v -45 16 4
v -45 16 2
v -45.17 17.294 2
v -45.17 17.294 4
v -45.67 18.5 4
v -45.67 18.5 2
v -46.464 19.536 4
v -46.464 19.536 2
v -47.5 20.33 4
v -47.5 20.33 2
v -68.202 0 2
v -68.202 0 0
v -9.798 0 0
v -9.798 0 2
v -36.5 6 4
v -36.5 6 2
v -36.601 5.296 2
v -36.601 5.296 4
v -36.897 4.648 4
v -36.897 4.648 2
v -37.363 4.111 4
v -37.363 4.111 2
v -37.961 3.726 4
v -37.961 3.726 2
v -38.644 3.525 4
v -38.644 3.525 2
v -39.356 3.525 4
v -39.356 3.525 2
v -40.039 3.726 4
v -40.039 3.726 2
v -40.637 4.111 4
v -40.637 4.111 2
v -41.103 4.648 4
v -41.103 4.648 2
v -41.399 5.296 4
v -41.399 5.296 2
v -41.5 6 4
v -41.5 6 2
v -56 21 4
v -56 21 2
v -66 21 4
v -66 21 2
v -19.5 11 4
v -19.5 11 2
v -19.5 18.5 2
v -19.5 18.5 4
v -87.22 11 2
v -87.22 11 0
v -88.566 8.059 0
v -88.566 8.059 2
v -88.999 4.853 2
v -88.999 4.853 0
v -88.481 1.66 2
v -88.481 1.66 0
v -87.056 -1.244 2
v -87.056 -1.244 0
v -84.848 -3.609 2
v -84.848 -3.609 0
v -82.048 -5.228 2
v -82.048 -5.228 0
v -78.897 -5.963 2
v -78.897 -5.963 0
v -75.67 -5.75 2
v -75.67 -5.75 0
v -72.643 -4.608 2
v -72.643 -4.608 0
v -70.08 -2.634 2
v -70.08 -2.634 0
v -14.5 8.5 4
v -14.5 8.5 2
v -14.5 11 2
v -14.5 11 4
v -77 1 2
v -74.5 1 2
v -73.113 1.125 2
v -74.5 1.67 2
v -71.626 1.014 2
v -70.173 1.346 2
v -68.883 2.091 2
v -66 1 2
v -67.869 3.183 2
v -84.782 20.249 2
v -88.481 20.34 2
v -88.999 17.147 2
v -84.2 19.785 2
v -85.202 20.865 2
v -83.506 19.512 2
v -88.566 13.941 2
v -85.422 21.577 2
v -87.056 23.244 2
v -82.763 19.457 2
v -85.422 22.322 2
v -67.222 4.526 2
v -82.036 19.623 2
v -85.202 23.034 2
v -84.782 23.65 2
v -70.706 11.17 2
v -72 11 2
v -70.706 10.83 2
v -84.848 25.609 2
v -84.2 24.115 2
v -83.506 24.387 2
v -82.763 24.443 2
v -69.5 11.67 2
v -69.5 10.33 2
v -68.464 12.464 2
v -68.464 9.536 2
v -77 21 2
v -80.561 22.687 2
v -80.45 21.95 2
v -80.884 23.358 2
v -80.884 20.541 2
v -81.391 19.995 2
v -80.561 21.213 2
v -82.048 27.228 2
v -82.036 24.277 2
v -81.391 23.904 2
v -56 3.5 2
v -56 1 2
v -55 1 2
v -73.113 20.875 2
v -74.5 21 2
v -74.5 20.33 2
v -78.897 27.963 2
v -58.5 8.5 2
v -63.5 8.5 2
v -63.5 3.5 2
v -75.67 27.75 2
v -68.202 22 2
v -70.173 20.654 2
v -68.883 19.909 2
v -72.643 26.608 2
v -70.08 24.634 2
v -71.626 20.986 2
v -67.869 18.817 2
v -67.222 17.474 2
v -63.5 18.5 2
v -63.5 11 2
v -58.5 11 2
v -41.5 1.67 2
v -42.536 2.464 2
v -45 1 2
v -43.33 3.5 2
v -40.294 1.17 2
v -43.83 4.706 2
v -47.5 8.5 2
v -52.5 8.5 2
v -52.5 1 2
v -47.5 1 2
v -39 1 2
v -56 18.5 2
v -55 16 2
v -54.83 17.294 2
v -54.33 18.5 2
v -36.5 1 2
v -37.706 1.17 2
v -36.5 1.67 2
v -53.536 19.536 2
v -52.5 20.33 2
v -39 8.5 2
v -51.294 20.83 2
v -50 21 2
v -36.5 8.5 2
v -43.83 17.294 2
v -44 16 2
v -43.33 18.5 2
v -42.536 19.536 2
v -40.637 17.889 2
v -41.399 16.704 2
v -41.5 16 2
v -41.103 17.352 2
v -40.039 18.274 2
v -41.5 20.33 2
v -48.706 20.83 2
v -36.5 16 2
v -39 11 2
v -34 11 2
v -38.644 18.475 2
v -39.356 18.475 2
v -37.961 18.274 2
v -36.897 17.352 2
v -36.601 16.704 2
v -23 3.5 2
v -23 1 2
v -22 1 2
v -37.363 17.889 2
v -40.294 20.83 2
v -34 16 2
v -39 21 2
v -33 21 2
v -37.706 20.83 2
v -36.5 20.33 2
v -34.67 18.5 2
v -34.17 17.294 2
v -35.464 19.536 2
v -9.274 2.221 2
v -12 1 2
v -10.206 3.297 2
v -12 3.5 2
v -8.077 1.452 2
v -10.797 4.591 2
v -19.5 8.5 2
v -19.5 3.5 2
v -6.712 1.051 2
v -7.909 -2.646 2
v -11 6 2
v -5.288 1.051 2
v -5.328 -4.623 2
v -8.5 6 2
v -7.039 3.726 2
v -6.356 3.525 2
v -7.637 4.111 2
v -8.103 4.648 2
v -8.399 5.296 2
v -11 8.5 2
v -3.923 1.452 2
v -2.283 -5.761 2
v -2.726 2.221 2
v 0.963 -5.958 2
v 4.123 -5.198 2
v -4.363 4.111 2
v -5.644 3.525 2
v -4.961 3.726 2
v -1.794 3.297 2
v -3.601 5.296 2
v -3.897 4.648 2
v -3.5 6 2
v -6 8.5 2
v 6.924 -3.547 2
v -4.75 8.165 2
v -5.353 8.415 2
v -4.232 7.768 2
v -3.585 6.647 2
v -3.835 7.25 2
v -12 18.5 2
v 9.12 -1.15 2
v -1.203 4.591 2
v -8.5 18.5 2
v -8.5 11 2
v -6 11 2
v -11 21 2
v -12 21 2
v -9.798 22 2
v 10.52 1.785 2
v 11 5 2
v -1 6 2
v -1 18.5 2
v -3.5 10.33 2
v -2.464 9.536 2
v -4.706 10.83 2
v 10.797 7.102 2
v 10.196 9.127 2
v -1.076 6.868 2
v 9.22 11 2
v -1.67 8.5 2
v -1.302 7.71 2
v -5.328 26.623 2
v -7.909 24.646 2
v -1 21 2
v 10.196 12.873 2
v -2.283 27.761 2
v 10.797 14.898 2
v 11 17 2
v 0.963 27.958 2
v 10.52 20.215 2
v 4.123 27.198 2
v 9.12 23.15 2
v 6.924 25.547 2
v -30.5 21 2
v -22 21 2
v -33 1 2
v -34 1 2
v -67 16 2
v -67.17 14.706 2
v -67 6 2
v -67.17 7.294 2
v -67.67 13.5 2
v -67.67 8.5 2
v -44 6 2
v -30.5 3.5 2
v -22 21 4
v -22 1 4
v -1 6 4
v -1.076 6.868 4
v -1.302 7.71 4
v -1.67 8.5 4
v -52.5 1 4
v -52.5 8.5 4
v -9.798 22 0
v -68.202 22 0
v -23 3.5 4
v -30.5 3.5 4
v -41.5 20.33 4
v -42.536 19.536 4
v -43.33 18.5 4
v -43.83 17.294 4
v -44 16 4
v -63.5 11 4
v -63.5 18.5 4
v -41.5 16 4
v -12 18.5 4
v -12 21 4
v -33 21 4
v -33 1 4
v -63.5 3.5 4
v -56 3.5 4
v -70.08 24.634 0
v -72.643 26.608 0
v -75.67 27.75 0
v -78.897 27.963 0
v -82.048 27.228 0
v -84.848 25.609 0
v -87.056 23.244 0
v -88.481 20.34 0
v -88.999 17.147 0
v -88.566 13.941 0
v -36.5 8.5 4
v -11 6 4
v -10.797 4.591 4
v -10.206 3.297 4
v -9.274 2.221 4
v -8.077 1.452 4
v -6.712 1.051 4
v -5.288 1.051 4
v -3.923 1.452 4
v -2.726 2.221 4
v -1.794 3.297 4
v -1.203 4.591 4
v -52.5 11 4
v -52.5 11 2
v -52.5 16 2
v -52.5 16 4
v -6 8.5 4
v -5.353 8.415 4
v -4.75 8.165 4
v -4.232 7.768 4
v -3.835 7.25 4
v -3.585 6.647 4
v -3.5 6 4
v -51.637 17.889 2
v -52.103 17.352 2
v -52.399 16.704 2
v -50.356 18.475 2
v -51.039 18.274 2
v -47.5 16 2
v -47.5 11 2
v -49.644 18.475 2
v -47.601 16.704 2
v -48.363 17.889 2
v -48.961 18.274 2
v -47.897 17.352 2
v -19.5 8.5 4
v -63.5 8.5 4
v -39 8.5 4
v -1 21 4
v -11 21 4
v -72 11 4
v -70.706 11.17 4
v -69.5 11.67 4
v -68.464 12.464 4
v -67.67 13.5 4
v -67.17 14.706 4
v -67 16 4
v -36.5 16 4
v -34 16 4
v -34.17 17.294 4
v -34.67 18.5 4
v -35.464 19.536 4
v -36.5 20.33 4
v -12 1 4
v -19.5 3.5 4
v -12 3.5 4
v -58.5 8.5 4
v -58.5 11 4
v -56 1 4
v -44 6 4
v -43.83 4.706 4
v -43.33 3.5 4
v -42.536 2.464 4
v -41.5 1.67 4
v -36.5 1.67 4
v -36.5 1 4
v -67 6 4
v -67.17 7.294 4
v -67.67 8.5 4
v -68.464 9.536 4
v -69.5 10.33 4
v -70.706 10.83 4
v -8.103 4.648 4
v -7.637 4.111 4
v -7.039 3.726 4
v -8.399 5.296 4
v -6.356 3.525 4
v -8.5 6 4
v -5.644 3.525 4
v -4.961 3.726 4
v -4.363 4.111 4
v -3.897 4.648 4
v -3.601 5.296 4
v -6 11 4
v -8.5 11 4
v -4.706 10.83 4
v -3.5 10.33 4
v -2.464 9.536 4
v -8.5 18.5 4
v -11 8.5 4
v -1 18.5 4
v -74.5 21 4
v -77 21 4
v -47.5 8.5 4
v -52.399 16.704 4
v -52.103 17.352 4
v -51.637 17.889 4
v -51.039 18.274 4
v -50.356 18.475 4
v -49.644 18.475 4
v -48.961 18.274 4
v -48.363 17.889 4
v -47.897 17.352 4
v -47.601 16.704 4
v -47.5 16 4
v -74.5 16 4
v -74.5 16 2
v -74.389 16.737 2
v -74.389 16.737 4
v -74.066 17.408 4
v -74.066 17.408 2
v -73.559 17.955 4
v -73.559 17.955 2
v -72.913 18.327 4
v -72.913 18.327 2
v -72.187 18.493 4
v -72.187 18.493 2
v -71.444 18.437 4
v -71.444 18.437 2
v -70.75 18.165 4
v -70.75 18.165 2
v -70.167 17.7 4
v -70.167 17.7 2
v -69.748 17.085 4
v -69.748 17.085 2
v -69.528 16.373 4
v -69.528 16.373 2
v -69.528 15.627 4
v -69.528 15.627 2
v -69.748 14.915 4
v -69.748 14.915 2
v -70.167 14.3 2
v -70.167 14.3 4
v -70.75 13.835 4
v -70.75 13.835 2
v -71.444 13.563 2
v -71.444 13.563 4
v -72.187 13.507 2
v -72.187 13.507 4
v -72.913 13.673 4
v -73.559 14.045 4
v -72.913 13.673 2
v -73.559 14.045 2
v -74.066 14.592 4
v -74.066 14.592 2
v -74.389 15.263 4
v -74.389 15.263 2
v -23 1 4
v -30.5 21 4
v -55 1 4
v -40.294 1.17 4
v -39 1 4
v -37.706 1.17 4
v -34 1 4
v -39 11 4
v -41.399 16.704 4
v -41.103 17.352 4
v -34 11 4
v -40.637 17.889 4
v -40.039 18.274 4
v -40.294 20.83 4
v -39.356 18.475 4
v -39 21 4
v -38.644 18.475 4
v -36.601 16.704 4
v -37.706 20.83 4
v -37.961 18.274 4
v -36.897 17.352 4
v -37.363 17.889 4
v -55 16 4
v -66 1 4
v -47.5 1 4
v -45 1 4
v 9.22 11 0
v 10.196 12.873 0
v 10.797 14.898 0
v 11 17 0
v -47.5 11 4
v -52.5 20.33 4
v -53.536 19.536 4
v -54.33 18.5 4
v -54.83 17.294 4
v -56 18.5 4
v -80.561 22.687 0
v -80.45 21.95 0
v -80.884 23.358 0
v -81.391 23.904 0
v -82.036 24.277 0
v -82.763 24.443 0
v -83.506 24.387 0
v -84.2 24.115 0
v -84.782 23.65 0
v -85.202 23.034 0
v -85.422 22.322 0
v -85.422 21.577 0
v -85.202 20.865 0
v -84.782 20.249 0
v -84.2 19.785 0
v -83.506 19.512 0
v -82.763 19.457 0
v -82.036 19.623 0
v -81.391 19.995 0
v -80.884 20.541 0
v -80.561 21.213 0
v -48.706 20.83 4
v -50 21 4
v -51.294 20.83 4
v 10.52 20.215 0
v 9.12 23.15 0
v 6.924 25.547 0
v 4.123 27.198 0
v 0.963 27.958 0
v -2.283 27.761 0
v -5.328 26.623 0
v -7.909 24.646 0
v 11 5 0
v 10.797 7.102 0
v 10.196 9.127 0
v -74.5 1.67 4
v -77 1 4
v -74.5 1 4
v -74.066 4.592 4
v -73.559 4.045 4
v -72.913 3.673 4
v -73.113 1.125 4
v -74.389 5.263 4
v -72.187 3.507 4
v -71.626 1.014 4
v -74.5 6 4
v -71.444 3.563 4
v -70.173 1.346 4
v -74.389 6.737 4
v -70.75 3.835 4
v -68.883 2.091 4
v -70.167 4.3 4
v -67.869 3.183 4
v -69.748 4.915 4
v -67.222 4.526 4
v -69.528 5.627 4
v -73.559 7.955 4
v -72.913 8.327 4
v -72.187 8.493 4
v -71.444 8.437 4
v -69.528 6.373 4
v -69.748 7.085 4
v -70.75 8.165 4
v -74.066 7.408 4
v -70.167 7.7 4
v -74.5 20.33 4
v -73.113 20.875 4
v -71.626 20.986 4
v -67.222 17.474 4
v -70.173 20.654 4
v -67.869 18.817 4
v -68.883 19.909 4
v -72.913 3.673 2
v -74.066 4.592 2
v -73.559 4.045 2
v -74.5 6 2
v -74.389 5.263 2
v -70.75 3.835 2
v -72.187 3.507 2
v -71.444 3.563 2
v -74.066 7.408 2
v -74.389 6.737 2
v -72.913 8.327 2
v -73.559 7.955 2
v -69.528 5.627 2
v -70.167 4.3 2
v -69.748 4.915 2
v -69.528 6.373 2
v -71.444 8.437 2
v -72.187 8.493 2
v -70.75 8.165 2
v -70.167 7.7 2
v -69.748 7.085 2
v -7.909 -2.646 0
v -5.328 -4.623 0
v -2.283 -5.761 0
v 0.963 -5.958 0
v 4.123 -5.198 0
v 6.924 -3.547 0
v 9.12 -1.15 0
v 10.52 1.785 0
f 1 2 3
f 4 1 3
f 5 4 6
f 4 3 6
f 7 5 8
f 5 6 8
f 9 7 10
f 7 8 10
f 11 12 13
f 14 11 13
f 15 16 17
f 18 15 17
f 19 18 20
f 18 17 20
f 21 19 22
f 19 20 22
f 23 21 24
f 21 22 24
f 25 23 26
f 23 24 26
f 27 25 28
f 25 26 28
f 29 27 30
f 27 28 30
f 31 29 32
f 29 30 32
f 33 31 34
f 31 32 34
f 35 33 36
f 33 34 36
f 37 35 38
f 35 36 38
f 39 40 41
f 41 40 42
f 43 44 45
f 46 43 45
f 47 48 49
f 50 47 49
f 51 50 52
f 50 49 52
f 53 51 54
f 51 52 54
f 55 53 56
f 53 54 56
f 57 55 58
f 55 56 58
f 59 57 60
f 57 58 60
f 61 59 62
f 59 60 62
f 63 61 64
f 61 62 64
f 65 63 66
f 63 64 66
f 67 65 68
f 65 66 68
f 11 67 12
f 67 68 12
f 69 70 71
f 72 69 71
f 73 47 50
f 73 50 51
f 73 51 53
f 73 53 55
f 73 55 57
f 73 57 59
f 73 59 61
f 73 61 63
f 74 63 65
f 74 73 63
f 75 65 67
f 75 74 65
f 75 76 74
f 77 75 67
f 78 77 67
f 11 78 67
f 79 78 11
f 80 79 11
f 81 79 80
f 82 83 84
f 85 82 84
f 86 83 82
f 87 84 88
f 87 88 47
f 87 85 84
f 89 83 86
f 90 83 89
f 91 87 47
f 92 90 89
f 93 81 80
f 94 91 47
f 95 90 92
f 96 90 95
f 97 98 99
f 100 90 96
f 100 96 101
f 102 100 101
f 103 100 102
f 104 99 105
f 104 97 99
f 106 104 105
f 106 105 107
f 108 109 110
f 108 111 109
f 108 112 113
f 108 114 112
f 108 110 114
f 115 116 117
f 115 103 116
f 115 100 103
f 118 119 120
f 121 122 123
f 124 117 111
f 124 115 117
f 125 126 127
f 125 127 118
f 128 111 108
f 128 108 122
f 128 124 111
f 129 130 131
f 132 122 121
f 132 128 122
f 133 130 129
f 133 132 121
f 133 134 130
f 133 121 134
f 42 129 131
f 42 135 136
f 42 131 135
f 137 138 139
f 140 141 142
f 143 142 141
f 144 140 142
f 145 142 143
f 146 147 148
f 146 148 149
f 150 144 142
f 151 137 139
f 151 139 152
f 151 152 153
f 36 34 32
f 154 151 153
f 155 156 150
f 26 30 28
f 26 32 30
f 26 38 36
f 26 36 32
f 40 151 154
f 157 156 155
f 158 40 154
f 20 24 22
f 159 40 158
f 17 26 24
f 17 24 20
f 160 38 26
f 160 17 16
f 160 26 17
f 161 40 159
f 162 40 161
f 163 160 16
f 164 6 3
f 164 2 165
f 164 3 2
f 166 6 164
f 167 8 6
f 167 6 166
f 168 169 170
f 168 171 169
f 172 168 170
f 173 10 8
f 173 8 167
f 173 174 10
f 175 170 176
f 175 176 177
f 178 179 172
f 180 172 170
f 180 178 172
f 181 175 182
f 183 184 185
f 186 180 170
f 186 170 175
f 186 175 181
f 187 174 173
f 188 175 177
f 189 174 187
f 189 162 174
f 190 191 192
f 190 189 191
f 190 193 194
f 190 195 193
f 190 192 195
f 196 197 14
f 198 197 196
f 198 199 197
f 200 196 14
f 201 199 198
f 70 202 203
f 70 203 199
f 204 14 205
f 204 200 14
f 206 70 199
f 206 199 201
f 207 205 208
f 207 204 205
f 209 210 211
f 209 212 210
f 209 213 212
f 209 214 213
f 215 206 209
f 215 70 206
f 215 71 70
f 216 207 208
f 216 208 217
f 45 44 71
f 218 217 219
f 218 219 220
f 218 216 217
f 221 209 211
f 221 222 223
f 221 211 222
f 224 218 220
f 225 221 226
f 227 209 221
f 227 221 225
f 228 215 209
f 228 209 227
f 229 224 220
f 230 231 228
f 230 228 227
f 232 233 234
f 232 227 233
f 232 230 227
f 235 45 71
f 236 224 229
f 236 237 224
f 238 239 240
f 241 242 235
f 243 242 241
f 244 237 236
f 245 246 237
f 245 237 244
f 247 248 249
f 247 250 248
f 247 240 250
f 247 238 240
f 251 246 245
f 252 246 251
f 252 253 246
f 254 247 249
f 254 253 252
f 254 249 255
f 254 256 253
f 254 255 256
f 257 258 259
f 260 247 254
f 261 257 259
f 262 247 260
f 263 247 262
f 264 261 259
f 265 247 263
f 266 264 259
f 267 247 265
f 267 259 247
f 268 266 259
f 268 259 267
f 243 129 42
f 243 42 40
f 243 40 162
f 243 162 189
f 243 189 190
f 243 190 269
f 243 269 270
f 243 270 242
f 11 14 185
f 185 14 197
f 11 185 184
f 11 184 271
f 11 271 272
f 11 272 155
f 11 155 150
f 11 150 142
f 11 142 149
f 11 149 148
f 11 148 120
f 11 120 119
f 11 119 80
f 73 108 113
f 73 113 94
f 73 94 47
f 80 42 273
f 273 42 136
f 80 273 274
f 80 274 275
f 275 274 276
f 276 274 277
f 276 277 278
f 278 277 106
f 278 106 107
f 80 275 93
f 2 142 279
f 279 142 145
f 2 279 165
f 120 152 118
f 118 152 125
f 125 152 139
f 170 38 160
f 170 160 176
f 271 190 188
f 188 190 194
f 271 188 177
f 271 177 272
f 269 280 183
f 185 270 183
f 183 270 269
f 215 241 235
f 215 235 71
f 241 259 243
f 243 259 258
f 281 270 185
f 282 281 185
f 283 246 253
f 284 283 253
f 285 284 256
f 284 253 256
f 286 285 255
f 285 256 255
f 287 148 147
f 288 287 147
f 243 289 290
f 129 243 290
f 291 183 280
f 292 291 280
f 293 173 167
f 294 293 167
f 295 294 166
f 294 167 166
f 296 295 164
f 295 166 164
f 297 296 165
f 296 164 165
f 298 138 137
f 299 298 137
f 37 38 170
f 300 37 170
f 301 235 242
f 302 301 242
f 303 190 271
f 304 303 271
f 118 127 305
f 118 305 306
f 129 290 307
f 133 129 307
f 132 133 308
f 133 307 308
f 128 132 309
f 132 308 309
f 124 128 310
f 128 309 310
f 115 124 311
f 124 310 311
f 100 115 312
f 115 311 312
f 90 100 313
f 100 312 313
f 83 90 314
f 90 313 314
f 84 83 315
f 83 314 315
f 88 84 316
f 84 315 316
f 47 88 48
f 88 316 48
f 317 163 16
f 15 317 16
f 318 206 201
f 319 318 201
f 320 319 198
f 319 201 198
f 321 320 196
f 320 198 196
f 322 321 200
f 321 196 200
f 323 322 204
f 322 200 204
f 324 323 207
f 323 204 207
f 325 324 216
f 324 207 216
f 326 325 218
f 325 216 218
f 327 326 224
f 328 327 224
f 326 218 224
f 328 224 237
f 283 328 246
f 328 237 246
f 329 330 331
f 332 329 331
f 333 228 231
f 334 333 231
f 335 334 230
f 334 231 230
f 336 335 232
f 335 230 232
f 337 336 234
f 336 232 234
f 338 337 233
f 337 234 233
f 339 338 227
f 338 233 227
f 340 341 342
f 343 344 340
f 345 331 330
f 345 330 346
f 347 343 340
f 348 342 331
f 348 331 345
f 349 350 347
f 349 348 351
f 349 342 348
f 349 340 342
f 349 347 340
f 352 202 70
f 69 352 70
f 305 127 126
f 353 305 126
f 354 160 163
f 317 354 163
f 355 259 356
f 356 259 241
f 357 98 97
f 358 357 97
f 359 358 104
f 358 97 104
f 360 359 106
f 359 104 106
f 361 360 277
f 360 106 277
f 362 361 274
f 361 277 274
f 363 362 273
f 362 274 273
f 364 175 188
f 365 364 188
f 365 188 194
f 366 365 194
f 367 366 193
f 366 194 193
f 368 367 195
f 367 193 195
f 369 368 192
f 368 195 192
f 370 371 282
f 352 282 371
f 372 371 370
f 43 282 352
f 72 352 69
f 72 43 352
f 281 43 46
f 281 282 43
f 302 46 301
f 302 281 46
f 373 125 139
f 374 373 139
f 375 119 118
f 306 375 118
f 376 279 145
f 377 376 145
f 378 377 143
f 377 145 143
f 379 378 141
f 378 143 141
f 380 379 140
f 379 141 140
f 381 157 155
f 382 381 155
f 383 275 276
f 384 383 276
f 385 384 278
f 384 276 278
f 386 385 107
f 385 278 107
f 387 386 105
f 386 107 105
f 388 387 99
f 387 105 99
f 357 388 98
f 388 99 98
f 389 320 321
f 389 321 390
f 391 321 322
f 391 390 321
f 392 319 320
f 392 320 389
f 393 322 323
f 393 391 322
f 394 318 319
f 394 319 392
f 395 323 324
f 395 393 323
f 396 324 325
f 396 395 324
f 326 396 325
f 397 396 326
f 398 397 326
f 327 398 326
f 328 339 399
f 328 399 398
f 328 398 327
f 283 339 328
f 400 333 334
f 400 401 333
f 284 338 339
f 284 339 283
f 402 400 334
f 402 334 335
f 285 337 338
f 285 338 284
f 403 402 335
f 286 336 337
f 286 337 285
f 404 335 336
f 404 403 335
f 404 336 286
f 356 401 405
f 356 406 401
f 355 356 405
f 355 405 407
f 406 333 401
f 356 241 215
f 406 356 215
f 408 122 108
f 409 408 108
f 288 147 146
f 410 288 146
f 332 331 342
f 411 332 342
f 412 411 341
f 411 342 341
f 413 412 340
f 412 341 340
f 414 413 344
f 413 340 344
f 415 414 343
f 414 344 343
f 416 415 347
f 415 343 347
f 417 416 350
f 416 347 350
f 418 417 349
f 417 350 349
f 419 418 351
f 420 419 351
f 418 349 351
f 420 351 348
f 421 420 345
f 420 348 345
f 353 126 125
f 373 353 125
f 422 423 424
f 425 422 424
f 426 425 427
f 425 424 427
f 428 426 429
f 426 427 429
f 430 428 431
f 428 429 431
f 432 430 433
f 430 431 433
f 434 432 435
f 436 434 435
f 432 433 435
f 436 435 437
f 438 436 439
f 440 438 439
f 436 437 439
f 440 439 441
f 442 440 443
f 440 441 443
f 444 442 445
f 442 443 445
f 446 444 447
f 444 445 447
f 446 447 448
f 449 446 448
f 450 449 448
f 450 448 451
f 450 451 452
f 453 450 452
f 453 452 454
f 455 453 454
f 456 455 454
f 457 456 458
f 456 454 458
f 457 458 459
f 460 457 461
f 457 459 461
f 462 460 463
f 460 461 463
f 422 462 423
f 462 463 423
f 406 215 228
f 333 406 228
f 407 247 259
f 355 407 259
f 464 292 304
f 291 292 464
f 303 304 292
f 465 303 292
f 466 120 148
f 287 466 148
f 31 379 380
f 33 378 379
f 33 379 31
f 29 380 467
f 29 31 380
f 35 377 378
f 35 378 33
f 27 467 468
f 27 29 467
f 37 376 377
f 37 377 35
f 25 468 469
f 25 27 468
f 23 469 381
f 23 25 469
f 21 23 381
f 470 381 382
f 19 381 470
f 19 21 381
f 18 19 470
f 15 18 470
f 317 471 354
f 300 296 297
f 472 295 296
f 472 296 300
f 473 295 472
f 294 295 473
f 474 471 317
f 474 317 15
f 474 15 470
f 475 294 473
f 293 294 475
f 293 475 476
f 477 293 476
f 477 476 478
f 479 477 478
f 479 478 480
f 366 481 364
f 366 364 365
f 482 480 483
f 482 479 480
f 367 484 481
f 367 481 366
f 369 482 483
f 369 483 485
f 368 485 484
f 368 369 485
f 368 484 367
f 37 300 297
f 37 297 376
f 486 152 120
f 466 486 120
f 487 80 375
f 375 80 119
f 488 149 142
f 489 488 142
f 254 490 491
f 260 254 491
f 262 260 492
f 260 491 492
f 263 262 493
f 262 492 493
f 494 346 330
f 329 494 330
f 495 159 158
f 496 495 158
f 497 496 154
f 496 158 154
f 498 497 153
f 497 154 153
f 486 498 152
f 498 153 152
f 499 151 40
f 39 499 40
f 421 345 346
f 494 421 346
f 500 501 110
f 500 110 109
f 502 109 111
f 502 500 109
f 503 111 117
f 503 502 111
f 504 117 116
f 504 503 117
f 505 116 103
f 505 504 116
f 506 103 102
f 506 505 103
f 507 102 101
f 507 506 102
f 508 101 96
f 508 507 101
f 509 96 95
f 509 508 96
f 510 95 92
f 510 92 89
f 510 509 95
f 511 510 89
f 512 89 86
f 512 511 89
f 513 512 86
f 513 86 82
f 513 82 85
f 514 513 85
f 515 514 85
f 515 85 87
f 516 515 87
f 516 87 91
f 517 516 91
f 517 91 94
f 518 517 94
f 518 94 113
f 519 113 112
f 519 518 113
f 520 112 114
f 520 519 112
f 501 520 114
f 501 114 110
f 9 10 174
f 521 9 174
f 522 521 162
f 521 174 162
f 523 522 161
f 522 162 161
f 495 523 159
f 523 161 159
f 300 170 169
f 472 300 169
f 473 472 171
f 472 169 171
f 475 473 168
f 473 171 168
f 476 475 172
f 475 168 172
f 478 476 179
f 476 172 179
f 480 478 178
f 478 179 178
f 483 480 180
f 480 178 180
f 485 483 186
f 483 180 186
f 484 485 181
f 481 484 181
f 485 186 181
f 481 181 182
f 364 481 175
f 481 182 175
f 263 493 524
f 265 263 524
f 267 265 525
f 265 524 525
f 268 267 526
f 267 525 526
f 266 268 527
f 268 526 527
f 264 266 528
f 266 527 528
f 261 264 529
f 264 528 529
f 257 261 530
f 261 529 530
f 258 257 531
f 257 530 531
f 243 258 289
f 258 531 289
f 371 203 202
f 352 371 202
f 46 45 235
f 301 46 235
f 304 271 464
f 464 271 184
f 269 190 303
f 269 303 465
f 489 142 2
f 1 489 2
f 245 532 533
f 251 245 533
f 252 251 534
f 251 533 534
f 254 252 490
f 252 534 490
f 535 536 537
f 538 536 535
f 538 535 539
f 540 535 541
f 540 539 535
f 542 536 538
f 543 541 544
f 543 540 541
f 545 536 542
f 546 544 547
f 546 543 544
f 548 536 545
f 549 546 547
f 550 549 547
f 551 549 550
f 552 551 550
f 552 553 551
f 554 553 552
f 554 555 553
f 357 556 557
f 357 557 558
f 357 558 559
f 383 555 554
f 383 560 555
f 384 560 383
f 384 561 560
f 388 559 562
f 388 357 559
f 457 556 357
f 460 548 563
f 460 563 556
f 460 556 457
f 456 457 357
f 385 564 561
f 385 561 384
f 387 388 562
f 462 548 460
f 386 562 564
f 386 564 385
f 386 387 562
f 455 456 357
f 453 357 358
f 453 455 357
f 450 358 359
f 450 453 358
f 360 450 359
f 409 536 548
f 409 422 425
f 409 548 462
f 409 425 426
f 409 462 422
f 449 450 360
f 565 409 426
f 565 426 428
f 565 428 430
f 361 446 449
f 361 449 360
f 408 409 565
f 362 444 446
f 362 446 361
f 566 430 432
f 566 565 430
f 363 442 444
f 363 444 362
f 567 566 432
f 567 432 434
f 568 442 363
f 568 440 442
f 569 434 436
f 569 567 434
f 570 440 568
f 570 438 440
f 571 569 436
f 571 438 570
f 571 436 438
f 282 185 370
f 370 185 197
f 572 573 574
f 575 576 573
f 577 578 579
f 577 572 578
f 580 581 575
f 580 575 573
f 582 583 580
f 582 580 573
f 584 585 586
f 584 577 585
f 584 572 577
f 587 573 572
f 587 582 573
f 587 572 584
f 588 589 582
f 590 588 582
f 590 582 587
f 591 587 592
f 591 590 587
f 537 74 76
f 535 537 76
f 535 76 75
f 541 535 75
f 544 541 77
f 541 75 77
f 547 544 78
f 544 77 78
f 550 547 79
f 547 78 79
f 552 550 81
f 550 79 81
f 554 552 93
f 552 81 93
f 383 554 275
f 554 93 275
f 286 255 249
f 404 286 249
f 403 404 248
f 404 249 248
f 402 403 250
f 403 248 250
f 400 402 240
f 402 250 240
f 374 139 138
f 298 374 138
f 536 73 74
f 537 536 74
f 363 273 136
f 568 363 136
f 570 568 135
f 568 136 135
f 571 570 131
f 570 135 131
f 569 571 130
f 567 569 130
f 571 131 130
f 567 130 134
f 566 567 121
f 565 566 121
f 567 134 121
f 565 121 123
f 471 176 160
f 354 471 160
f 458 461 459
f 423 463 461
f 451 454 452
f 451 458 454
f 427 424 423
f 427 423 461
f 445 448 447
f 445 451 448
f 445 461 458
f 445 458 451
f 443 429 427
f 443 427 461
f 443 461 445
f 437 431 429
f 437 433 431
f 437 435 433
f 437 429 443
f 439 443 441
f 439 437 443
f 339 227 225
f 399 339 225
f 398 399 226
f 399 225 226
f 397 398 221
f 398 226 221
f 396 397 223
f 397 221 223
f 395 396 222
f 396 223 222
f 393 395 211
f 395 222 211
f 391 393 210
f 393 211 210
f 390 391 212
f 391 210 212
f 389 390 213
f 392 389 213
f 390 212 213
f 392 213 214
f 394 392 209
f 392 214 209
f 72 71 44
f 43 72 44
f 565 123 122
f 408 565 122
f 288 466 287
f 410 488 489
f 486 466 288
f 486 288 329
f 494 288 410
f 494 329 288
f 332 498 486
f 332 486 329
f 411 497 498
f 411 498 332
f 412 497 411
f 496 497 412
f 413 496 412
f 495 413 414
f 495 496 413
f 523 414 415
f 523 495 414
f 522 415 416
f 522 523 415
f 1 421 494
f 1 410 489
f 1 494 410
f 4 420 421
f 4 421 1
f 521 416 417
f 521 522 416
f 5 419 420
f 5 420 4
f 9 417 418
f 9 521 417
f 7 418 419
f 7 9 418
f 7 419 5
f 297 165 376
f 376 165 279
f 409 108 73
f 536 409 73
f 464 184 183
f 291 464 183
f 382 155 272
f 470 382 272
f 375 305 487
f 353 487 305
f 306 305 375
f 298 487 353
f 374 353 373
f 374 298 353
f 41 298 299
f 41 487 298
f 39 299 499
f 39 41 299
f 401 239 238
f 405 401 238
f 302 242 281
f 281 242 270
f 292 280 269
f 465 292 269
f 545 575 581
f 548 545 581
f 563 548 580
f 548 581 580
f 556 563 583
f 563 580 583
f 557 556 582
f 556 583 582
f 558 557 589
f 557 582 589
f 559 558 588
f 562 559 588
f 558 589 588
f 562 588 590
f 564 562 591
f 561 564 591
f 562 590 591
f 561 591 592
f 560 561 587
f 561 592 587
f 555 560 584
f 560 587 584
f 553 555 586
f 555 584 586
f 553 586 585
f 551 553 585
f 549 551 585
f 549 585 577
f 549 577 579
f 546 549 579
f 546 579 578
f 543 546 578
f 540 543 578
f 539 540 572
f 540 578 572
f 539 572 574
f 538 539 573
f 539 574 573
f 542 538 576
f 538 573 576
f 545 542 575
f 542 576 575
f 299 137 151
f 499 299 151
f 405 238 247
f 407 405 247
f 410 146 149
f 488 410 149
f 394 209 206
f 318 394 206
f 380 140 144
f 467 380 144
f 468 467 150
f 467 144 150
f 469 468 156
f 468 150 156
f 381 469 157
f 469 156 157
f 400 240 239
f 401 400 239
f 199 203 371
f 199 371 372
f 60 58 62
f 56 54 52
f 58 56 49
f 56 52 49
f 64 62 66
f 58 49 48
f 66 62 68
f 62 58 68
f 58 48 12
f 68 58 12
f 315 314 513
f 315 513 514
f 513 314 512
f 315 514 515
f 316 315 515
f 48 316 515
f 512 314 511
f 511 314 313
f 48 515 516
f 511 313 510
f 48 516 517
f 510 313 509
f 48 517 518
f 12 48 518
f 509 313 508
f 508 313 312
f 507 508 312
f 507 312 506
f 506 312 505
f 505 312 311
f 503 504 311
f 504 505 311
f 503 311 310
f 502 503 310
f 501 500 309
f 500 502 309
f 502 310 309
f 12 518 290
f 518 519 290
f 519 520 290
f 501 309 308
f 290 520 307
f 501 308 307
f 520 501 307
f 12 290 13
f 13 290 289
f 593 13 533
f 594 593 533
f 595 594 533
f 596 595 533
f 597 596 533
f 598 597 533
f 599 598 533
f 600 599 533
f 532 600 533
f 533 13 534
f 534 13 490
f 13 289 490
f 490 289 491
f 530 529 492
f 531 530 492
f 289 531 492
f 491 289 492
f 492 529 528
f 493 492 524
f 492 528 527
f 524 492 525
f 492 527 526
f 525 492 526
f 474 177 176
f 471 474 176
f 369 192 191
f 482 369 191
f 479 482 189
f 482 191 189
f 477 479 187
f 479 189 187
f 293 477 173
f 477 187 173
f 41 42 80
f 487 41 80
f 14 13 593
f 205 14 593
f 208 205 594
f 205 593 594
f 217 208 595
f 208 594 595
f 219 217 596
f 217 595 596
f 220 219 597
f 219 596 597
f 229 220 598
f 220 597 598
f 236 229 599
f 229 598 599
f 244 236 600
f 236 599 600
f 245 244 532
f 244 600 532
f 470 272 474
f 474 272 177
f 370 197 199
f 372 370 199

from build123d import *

# Parameters (mm, degrees)
F0_R     = 2.5
F1_DEPTH = 2
F2_W     = 7.5
F2_H     = 2.5
F2_W_2   = 2.5
F2_H_2   = 7.5
F2_W_3   = 5
F2_H_3   = 5
F2_H_4   = 17.5
F3_DEPTH = 2


with BuildPart() as f1:
    # F0 (on Top) → F1 (new body)
    with BuildSketch(Plane.XY):
        with BuildLine():
            Line((0, 6), (0, 0))
            Line((0, 0), (-9.7979589711, 0))
            ThreePointArc((-9.7979589711, 0), (2.5712303784, -5.695268783), (11, 5))
            ThreePointArc((11, 5), (10.5454964091, 8.129297922), (9.2195444573, 11))
            ThreePointArc((9.2195444573, 11), (5.2440442409, 7.3304601971), (0, 6))
        make_face()
        with BuildLine():
            Line((-9.7979589711, 0), (0, 0))
            Line((0, 0), (0, 6))
            ThreePointArc((0, 6), (-5.2440442409, 7.3304601971), (-9.2195444573, 11))
            ThreePointArc((-9.2195444573, 11), (-10.9848240388, 5.5776165142), (-9.7979589711, 0))
        make_face()
        with BuildLine():
            Line((-68.2020410289, 0), (-9.7979589711, 0))
            ThreePointArc((-9.7979589711, 0), (-10.9848240388, 5.5776165142), (-9.2195444573, 11))
            ThreePointArc((-9.2195444573, 11), (-10.9848240388, 16.4223834858), (-9.7979589711, 22))
            Line((-9.7979589711, 22), (-68.2020410289, 22))
            ThreePointArc((-68.2020410289, 22), (-67.304731217, 19.5712303784), (-67, 17))
            ThreePointArc((-67, 17), (-67.4545035909, 13.870702078), (-68.7804555427, 11))
            ThreePointArc((-68.7804555427, 11), (-67.4545035909, 8.129297922), (-67, 5))
            ThreePointArc((-67, 5), (-67.304731217, 2.4287696216), (-68.2020410289, 0))
        make_face()
        with BuildLine():
            Line((0, 16), (0, 6))
            ThreePointArc((0, 6), (5.2440442409, 7.3304601971), (9.2195444573, 11))
            ThreePointArc((9.2195444573, 11), (5.2440442409, 14.6695398029), (0, 16))
        make_face()
        with BuildLine():
            ThreePointArc((-87.2195444573, 11), (-83.5075984637, -4.5218884242), (-68.2020410289, 0))
            Line((-68.2020410289, 0), (-78, 0))
            Line((-78, 0), (-78, 6))
            ThreePointArc((-78, 6), (-83.2440442409, 7.3304601971), (-87.2195444573, 11))
        make_face()
        with BuildLine():
            Line((-78, 0), (-68.2020410289, 0))
            ThreePointArc((-68.2020410289, 0), (-67.304731217, 2.4287696216), (-67, 5))
            ThreePointArc((-67, 5), (-67.4545035909, 8.129297922), (-68.7804555427, 11))
            ThreePointArc((-68.7804555427, 11), (-72.7559557591, 7.3304601971), (-78, 6))
            Line((-78, 6), (-78, 0))
        make_face()
        with BuildLine():
            ThreePointArc((-9.7979589711, 22), (-10.9848240388, 16.4223834858), (-9.2195444573, 11))
            ThreePointArc((-9.2195444573, 11), (-5.2440442409, 14.6695398029), (0, 16))
            Line((0, 16), (0, 22))
            Line((0, 22), (-9.7979589711, 22))
        make_face()
        with BuildLine():
            Line((0, 22), (0, 16))
            ThreePointArc((0, 16), (5.2440442409, 14.6695398029), (9.2195444573, 11))
            ThreePointArc((9.2195444573, 11), (10.5454964091, 13.870702078), (11, 17))
            ThreePointArc((11, 17), (2.5712303784, 27.695268783), (-9.7979589711, 22))
            Line((-9.7979589711, 22), (0, 22))
        make_face()
        with BuildLine():
            ThreePointArc((-78, 16), (-83.2440442409, 14.6695398029), (-87.2195444573, 11))
            ThreePointArc((-87.2195444573, 11), (-83.2440442409, 7.3304601971), (-78, 6))
            Line((-78, 6), (-78, 16))
        make_face()
        with BuildLine():
            ThreePointArc((-68.2020410289, 22), (-83.5075984637, 26.5218884242), (-87.2195444573, 11))
            ThreePointArc((-87.2195444573, 11), (-83.2440442409, 14.6695398029), (-78, 16))
            Line((-78, 16), (-78, 22))
            Line((-78, 22), (-68.2020410289, 22))
        make_face()
        with Locations((-82.9497474683, 21.9497474683)):
            Circle(F0_R, mode=Mode.SUBTRACT)
        with BuildLine():
            ThreePointArc((-67, 17), (-67.304731217, 19.5712303784), (-68.2020410289, 22))
            Line((-68.2020410289, 22), (-78, 22))
            Line((-78, 22), (-78, 16))
            ThreePointArc((-78, 16), (-72.7559557591, 14.6695398029), (-68.7804555427, 11))
            ThreePointArc((-68.7804555427, 11), (-67.4545035909, 13.870702078), (-67, 17))
        make_face()
        with BuildLine():
            Line((-78, 16), (-78, 6))
            ThreePointArc((-78, 6), (-72.7559557591, 7.3304601971), (-68.7804555427, 11))
            ThreePointArc((-68.7804555427, 11), (-72.7559557591, 14.6695398029), (-78, 16))
        make_face()
        with BuildLine():
            ThreePointArc((-9.2195444573, 11), (-5.2440442409, 7.3304601971), (0, 6))
            Line((0, 6), (0, 16))
            ThreePointArc((0, 16), (-5.2440442409, 14.6695398029), (-9.2195444573, 11))
        make_face()
    extrude(amount=F1_DEPTH)

    # F2 (on face) → F3 (join)
    with BuildSketch(Plane.XY.offset(2)):
        with Locations((-4.75, 19.75)):
            Rectangle(F2_W, F2_H)
        with Locations((-9.75, 19.75)):
            Rectangle(F2_W_2, F2_H)
        with Locations((-9.75, 14.75)):
            Rectangle(F2_W_2, F2_H_2)
        with BuildLine():
            Line((-8.5, 11), (-11, 11))
            Line((-11, 11), (-11, 8.5))
            Line((-11, 8.5), (-10.3301270189, 8.5))
            ThreePointArc((-10.3301270189, 8.5), (-8.5, 10.3301270189), (-6, 11))
            Line((-6, 11), (-8.5, 11))
        make_face()
        with BuildLine():
            ThreePointArc((-1.6698729811, 8.5), (-3.5, 10.3301270189), (-6, 11))
            ThreePointArc((-6, 11), (-8.5, 10.3301270189), (-10.3301270189, 8.5))
            Line((-10.3301270189, 8.5), (-6, 8.5))
            Line((-6, 8.5), (-1.6698729811, 8.5))
        make_face()
        with BuildLine():
            Line((-8.5, 6), (-11, 6))
            ThreePointArc((-11, 6), (-6, 1), (-1, 6))
            ThreePointArc((-1, 6), (-1.1703708686, 7.2940952255), (-1.6698729811, 8.5))
            Line((-1.6698729811, 8.5), (-6, 8.5))
            ThreePointArc((-6, 8.5), (-4.232233047, 7.767766953), (-3.5, 6))
            ThreePointArc((-3.5, 6), (-6, 3.5), (-8.5, 6))
        make_face()
        with Locations((-17, 9.75)):
            Rectangle(F2_W_3, F2_H)
        with Locations((-20.75, 9.75)):
            Rectangle(F2_W_2, F2_H)
        with Locations((-20.75, 14.75)):
            Rectangle(F2_W_2, F2_H_2)
        with Locations((-20.75, 19.75)):
            Rectangle(F2_W_2, F2_H)
        with Locations((-15.75, 19.75)):
            Rectangle(F2_W, F2_H)
        with Locations((-20.75, 6)):
            Rectangle(F2_W_2, F2_H_3)
        with Locations((-20.75, 2.25)):
            Rectangle(F2_W_2, F2_H)
        with Locations((-15.75, 2.25)):
            Rectangle(F2_W, F2_H)
        with Locations((-26.75, 2.25)):
            Rectangle(F2_W, F2_H)
        with Locations((-31.75, 2.25)):
            Rectangle(F2_W_2, F2_H)
        with Locations((-31.75, 12.25)):
            Rectangle(F2_W_2, F2_H_4)
        with BuildLine():
            Line((-41.5, 16), (-41.5, 20.3301270189))
            ThreePointArc((-41.5, 20.3301270189), (-43.3301270189, 18.5), (-44, 16))
            ThreePointArc((-44, 16), (-43.3301270189, 13.5), (-41.5, 11.6698729811))
            Line((-41.5, 11.6698729811), (-41.5, 16))
        make_face()
        with BuildLine():
            ThreePointArc((-41.5, 11.6698729811), (-43.3301270189, 13.5), (-44, 16))
            Line((-44, 16), (-44, 11))
            Line((-44, 11), (-41.5, 11))
            Line((-41.5, 11), (-41.5, 11.6698729811))
        make_face()
        with BuildLine():
            ThreePointArc((-43.3301270189, 8.5), (-42.5355339059, 9.5355339059), (-41.5, 10.3301270189))
            Line((-41.5, 10.3301270189), (-41.5, 11))
            Line((-41.5, 11), (-44, 11))
            Line((-44, 11), (-44, 8.5))
            Line((-44, 8.5), (-43.3301270189, 8.5))
        make_face()
        with BuildLine():
            Line((-41.5, 8.5), (-43.3301270189, 8.5))
            ThreePointArc((-43.3301270189, 8.5), (-43.8296291314, 7.2940952255), (-44, 6))
            ThreePointArc((-44, 6), (-43.3301270189, 3.5), (-41.5, 1.6698729811))
            Line((-41.5, 1.6698729811), (-41.5, 5.9999999784))
            Line((-41.5, 5.9999999784), (-41.5, 8.5))
        make_face()
        with BuildLine():
            ThreePointArc((-44, 6), (-43.8296291314, 7.2940952255), (-43.3301270189, 8.5))
            Line((-43.3301270189, 8.5), (-44, 8.5))
            Line((-44, 8.5), (-44, 6))
        make_face()
        with BuildLine():
            Line((-41.5, 8.5), (-41.5, 10.3301270189))
            ThreePointArc((-41.5, 10.3301270189), (-42.5355339059, 9.5355339059), (-43.3301270189, 8.5))
            Line((-43.3301270189, 8.5), (-41.5, 8.5))
        make_face()
        with BuildLine():
            ThreePointArc((-36.5, 10.3301270189), (-37.7059047745, 10.8296291314), (-39, 11))
            Line((-39, 11), (-39, 8.5))
            Line((-39, 8.5), (-36.5, 8.5))
            Line((-36.5, 8.5), (-36.5, 10.3301270189))
        make_face()
        with BuildLine():
            Line((-36.5, 11), (-39, 11))
            ThreePointArc((-39, 11), (-37.7059047745, 10.8296291314), (-36.5, 10.3301270189))
            Line((-36.5, 10.3301270189), (-36.5, 11))
        make_face()
        with BuildLine():
            Line((-34, 11), (-36.5, 11))
            Line((-36.5, 11), (-36.5, 10.3301270189))
            ThreePointArc((-36.5, 10.3301270189), (-35.4644660941, 9.5355339059), (-34.6698729811, 8.5))
            Line((-34.6698729811, 8.5), (-34, 8.5))
            Line((-34, 8.5), (-34, 11))
        make_face()
        with BuildLine():
            ThreePointArc((-34.6698729811, 8.5), (-35.4644660941, 9.5355339059), (-36.5, 10.3301270189))
            Line((-36.5, 10.3301270189), (-36.5, 8.5))
            Line((-36.5, 8.5), (-34.6698729811, 8.5))
        make_face()
        with BuildLine():
            ThreePointArc((-34, 6), (-34.1703708686, 7.2940952255), (-34.6698729811, 8.5))
            Line((-34.6698729811, 8.5), (-36.5, 8.5))
            Line((-36.5, 8.5), (-36.5, 6))
            Line((-36.5, 6), (-36.5, 1.6698729811))
            ThreePointArc((-36.5, 1.6698729811), (-34.6698729811, 3.5), (-34, 6))
        make_face()
        with BuildLine():
            Line((-34, 8.5), (-34.6698729811, 8.5))
            ThreePointArc((-34.6698729811, 8.5), (-34.1703708686, 7.2940952255), (-34, 6))
            Line((-34, 6), (-34, 8.5))
        make_face()
        with BuildLine():
            Line((-34, 1), (-34, 6))
            ThreePointArc((-34, 6), (-34.6698729811, 3.5), (-36.5, 1.6698729811))
            Line((-36.5, 1.6698729811), (-36.5, 1))
            Line((-36.5, 1), (-34, 1))
        make_face()
        with BuildLine():
            Line((-36.5, 1.6698729811), (-36.5, 6))
            ThreePointArc((-36.5, 6), (-38.9999999892, 3.5), (-41.5, 5.9999999784))
            Line((-41.5, 5.9999999784), (-41.5, 1.6698729811))
            ThreePointArc((-41.5, 1.6698729811), (-39, 1), (-36.5, 1.6698729811))
        make_face()
        with BuildLine():
            Line((-36.5, 16), (-34, 16))
            ThreePointArc((-34, 16), (-34.6698729811, 18.5), (-36.5, 20.3301270189))
            Line((-36.5, 20.3301270189), (-36.5, 16))
        make_face()
        with BuildLine():
            Line((-36.5, 16), (-36.5, 20.3301270189))
            ThreePointArc((-36.5, 20.3301270189), (-39, 21), (-41.5, 20.3301270189))
            Line((-41.5, 20.3301270189), (-41.5, 16))
            ThreePointArc((-41.5, 16), (-39, 18.5), (-36.5, 16))
        make_face()
        with BuildLine():
            ThreePointArc((-52.5, 20.3301270189), (-54.3301270189, 18.5), (-55, 16))
            ThreePointArc((-55, 16), (-54.3301270189, 13.5), (-52.5, 11.6698729811))
            Line((-52.5, 11.6698729811), (-52.5, 16))
            Line((-52.5, 16), (-52.5, 20.3301270189))
        make_face()
        with BuildLine():
            Line((-55, 16), (-55, 11))
            Line((-55, 11), (-52.5, 11))
            Line((-52.5, 11), (-52.5, 11.6698729811))
            ThreePointArc((-52.5, 11.6698729811), (-54.3301270189, 13.5), (-55, 16))
        make_face()
        with Locations((-53.75, 9.75)):
            Rectangle(F2_W_2, F2_H)
        with Locations((-53.75, 4.75)):
            Rectangle(F2_W_2, F2_H_2)
        with Locations((-46.25, 4.75)):
            Rectangle(F2_W_2, F2_H_2)
        with Locations((-46.25, 9.75)):
            Rectangle(F2_W_2, F2_H)
        with BuildLine():
            Line((-47.5, 11.6698729811), (-47.5, 11))
            Line((-47.5, 11), (-45, 11))
            Line((-45, 11), (-45, 16))
            ThreePointArc((-45, 16), (-45.6698729811, 13.5), (-47.5, 11.6698729811))
        make_face()
        with BuildLine():
            ThreePointArc((-45, 16), (-45.6698729811, 18.5), (-47.5, 20.3301270189))
            Line((-47.5, 20.3301270189), (-47.5, 16))
            Line((-47.5, 16), (-47.5, 11.6698729811))
            ThreePointArc((-47.5, 11.6698729811), (-45.6698729811, 13.5), (-45, 16))
        make_face()
        with BuildLine():
            ThreePointArc((-47.5, 20.3301270189), (-50, 21), (-52.5, 20.3301270189))
            Line((-52.5, 20.3301270189), (-52.5, 16))
            ThreePointArc((-52.5, 16), (-50, 18.5), (-47.5, 16))
            Line((-47.5, 16), (-47.5, 20.3301270189))
        make_face()
        Polygon((-50, 11), (-52.5, 11), (-52.5, 8.5), (-47.5, 8.5), (-47.5, 11), align=None)
        with Locations((-61, 9.7500000475)):
            Rectangle(F2_W_3, F2_H)
        with Locations((-64.75, 9.7500000475)):
            Rectangle(F2_W_2, F2_H)
        with Locations((-64.75, 14.7500000475)):
            Rectangle(F2_W_2, F2_H_2)
        with Locations((-64.75, 19.7500000475)):
            Rectangle(F2_W_2, F2_H)
        with Locations((-59.75, 19.7500000475)):
            Rectangle(F2_W, F2_H)
        with Locations((-64.75, 6.0000000475)):
            Rectangle(F2_W_2, F2_H_3)
        with Locations((-64.75, 2.2500000475)):
            Rectangle(F2_W_2, F2_H)
        with Locations((-59.75, 2.2500000475)):
            Rectangle(F2_W, F2_H)
        with BuildLine():
            ThreePointArc((-67, 6), (-68.4644660941, 9.5355339059), (-72, 11))
            ThreePointArc((-72, 11), (-73.2940952255, 10.8296291314), (-74.5, 10.3301270189))
            Line((-74.5, 10.3301270189), (-74.5, 6))
            Line((-74.5, 6), (-74.5, 1.6698729811))
            ThreePointArc((-74.5, 1.6698729811), (-69.5, 1.6698729811), (-67, 6))
        make_face()
        with BuildLine():
            ThreePointArc((-69.5, 6), (-72, 3.5), (-74.5, 6))
            ThreePointArc((-74.5, 6), (-72, 8.5), (-69.5, 6))
        make_face(mode=Mode.SUBTRACT)
        with BuildLine():
            ThreePointArc((-72, 11), (-68.4644660941, 12.4644660941), (-67, 16))
            ThreePointArc((-67, 16), (-69.5, 20.3301270189), (-74.5, 20.3301270189))
            Line((-74.5, 20.3301270189), (-74.5, 16))
            Line((-74.5, 16), (-74.5, 11.6698729811))
            ThreePointArc((-74.5, 11.6698729811), (-73.2940952255, 11.1703708686), (-72, 11))
        make_face()
        with BuildLine():
            ThreePointArc((-69.5, 16), (-72, 13.5), (-74.5, 16))
            ThreePointArc((-74.5, 16), (-72, 18.5), (-69.5, 16))
        make_face(mode=Mode.SUBTRACT)
        with BuildLine():
            ThreePointArc((-74.5, 10.3301270189), (-73.2940952255, 10.8296291314), (-72, 11))
            ThreePointArc((-72, 11), (-73.2940952255, 11.1703708686), (-74.5, 11.6698729811))
            Line((-74.5, 11.6698729811), (-74.5, 10.3301270189))
        make_face()
        with BuildLine():
            Line((-74.5, 16), (-74.5, 20.3301270189))
            ThreePointArc((-74.5, 20.3301270189), (-76.3301270189, 18.5), (-77, 16))
            ThreePointArc((-77, 16), (-76.3301270189, 13.5), (-74.5, 11.6698729811))
            Line((-74.5, 11.6698729811), (-74.5, 16))
        make_face()
        with BuildLine():
            ThreePointArc((-74.5, 11.6698729811), (-76.3301270189, 13.5), (-77, 16))
            Line((-77, 16), (-77, 6))
            ThreePointArc((-77, 6), (-76.3301270189, 8.5), (-74.5, 10.3301270189))
            Line((-74.5, 10.3301270189), (-74.5, 11.6698729811))
        make_face()
        with BuildLine():
            Line((-74.5, 6), (-74.5, 10.3301270189))
            ThreePointArc((-74.5, 10.3301270189), (-76.3301270189, 8.5), (-77, 6))
            ThreePointArc((-77, 6), (-76.3301270189, 3.5), (-74.5, 1.6698729811))
            Line((-74.5, 1.6698729811), (-74.5, 6))
        make_face()
        with BuildLine():
            ThreePointArc((-74.5, 1.6698729811), (-76.3301270189, 3.5), (-77, 6))
            Line((-77, 6), (-77, 1))
            Line((-77, 1), (-74.5, 1))
            Line((-74.5, 1), (-74.5, 1.6698729811))
        make_face()
        with BuildLine():
            ThreePointArc((-77, 16), (-76.3301270189, 18.5), (-74.5, 20.3301270189))
            Line((-74.5, 20.3301270189), (-74.5, 21))
            Line((-74.5, 21), (-77, 21))
            Line((-77, 21), (-77, 16))
        make_face()
    extrude(amount=F3_DEPTH)


solid = f1.part
